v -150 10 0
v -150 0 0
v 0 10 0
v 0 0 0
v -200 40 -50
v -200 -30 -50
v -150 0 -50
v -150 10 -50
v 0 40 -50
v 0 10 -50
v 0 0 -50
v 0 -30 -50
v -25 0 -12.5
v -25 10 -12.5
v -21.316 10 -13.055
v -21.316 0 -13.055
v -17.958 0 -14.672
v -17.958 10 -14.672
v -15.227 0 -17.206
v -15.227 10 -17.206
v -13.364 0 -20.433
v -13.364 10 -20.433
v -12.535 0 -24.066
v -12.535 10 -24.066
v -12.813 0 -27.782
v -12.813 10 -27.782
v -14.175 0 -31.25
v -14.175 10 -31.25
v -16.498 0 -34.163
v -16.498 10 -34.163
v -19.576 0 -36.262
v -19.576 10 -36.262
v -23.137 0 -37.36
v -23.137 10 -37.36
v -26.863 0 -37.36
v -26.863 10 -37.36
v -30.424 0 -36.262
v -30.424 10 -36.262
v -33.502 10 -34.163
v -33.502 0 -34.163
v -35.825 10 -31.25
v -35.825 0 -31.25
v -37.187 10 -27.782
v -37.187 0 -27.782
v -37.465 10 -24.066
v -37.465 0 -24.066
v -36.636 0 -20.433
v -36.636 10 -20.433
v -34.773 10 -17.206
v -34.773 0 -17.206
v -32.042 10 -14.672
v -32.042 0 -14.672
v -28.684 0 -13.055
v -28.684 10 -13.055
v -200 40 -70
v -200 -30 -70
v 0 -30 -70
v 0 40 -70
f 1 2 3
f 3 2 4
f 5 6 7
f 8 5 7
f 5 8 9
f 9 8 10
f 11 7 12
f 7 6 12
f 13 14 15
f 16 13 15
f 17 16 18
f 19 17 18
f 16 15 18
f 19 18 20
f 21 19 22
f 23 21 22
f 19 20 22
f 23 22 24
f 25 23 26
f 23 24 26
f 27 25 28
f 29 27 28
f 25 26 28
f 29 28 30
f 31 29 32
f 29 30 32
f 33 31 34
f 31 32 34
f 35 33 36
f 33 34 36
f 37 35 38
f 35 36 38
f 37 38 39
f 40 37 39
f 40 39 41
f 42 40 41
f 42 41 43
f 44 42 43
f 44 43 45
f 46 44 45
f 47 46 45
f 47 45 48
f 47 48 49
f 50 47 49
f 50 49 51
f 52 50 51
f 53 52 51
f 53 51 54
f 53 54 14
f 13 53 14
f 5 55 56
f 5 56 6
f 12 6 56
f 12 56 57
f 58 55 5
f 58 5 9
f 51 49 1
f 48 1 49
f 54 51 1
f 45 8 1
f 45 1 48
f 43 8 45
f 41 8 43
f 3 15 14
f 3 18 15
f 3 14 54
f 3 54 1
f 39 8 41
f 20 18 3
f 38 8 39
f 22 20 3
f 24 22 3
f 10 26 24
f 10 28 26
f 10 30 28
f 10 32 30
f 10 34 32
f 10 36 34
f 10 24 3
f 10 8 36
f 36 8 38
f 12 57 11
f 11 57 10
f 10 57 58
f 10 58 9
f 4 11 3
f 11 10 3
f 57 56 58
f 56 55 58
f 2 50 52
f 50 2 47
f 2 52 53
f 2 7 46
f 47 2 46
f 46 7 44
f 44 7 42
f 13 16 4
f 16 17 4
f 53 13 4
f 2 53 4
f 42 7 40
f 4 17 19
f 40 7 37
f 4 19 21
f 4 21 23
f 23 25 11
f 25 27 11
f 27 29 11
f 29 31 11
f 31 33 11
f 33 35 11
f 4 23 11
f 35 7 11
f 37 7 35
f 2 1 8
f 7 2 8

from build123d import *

# Parameters (mm, degrees)
SKETCH1_W           = 200
SKETCH1_H           = 70
BOSS_EXTRUDE1_DEPTH = 10
SKETCH2_W           = 200
SKETCH2_H           = 20
BOSS_EXTRUDE2_DEPTH = 30
SKETCH3_W           = 200
SKETCH3_H           = 20
BOSS_EXTRUDE3_DEPTH = 30
SKETCH4_R           = 12.5
CUT_EXTRUDE1_DEPTH  = 30
SKETCH5_W           = 50
SKETCH5_H           = 50
CUT_EXTRUDE2_DEPTH  = 30


with BuildPart() as part:
    # Sketch1 → Boss-Extrude1 (new body)
    with BuildSketch(Plane(origin=(0, 0, 0), x_dir=(1, 0, 0), z_dir=(0, 1, 0))):
        with Locations((-100, 35)):
            Rectangle(SKETCH1_W, SKETCH1_H)
    extrude(amount=BOSS_EXTRUDE1_DEPTH)

    # Sketch2 → Boss-Extrude2 (add)
    with BuildSketch(Plane(origin=(0, 10, 0), x_dir=(1, 0, 0), z_dir=(0, 1, 0))):
        with Locations((-100, 60)):
            Rectangle(SKETCH2_W, SKETCH2_H)
    extrude(amount=BOSS_EXTRUDE2_DEPTH)

    # Sketch3 → Boss-Extrude3 (add)
    with BuildSketch(Plane.XZ):
        with Locations((-100, -60)):
            Rectangle(SKETCH3_W, SKETCH3_H)
    extrude(amount=BOSS_EXTRUDE3_DEPTH)

    # Sketch4 → Cut-Extrude1 (cut)
    with BuildSketch(Plane(origin=(0, 10, 0), x_dir=(1, 0, 0), z_dir=(0, 1, 0))):
        with Locations(Location((-25, 25, 0), (0, 0, 270))):
            Circle(SKETCH4_R)
        with Locations(Location((-175, 25, 0), (0, 0, 270))):
            Circle(SKETCH4_R)
    extrude(amount=-CUT_EXTRUDE1_DEPTH, mode=Mode.SUBTRACT)

    # Sketch5 → Cut-Extrude2 (cut)
    with BuildSketch(Plane(origin=(0, 10, 0), x_dir=(1, 0, 0), z_dir=(0, 1, 0))):
        with Locations((-175, 25)):
            Rectangle(SKETCH5_W, SKETCH5_H)
    extrude(amount=-CUT_EXTRUDE2_DEPTH, mode=Mode.SUBTRACT)


solid = part.part
